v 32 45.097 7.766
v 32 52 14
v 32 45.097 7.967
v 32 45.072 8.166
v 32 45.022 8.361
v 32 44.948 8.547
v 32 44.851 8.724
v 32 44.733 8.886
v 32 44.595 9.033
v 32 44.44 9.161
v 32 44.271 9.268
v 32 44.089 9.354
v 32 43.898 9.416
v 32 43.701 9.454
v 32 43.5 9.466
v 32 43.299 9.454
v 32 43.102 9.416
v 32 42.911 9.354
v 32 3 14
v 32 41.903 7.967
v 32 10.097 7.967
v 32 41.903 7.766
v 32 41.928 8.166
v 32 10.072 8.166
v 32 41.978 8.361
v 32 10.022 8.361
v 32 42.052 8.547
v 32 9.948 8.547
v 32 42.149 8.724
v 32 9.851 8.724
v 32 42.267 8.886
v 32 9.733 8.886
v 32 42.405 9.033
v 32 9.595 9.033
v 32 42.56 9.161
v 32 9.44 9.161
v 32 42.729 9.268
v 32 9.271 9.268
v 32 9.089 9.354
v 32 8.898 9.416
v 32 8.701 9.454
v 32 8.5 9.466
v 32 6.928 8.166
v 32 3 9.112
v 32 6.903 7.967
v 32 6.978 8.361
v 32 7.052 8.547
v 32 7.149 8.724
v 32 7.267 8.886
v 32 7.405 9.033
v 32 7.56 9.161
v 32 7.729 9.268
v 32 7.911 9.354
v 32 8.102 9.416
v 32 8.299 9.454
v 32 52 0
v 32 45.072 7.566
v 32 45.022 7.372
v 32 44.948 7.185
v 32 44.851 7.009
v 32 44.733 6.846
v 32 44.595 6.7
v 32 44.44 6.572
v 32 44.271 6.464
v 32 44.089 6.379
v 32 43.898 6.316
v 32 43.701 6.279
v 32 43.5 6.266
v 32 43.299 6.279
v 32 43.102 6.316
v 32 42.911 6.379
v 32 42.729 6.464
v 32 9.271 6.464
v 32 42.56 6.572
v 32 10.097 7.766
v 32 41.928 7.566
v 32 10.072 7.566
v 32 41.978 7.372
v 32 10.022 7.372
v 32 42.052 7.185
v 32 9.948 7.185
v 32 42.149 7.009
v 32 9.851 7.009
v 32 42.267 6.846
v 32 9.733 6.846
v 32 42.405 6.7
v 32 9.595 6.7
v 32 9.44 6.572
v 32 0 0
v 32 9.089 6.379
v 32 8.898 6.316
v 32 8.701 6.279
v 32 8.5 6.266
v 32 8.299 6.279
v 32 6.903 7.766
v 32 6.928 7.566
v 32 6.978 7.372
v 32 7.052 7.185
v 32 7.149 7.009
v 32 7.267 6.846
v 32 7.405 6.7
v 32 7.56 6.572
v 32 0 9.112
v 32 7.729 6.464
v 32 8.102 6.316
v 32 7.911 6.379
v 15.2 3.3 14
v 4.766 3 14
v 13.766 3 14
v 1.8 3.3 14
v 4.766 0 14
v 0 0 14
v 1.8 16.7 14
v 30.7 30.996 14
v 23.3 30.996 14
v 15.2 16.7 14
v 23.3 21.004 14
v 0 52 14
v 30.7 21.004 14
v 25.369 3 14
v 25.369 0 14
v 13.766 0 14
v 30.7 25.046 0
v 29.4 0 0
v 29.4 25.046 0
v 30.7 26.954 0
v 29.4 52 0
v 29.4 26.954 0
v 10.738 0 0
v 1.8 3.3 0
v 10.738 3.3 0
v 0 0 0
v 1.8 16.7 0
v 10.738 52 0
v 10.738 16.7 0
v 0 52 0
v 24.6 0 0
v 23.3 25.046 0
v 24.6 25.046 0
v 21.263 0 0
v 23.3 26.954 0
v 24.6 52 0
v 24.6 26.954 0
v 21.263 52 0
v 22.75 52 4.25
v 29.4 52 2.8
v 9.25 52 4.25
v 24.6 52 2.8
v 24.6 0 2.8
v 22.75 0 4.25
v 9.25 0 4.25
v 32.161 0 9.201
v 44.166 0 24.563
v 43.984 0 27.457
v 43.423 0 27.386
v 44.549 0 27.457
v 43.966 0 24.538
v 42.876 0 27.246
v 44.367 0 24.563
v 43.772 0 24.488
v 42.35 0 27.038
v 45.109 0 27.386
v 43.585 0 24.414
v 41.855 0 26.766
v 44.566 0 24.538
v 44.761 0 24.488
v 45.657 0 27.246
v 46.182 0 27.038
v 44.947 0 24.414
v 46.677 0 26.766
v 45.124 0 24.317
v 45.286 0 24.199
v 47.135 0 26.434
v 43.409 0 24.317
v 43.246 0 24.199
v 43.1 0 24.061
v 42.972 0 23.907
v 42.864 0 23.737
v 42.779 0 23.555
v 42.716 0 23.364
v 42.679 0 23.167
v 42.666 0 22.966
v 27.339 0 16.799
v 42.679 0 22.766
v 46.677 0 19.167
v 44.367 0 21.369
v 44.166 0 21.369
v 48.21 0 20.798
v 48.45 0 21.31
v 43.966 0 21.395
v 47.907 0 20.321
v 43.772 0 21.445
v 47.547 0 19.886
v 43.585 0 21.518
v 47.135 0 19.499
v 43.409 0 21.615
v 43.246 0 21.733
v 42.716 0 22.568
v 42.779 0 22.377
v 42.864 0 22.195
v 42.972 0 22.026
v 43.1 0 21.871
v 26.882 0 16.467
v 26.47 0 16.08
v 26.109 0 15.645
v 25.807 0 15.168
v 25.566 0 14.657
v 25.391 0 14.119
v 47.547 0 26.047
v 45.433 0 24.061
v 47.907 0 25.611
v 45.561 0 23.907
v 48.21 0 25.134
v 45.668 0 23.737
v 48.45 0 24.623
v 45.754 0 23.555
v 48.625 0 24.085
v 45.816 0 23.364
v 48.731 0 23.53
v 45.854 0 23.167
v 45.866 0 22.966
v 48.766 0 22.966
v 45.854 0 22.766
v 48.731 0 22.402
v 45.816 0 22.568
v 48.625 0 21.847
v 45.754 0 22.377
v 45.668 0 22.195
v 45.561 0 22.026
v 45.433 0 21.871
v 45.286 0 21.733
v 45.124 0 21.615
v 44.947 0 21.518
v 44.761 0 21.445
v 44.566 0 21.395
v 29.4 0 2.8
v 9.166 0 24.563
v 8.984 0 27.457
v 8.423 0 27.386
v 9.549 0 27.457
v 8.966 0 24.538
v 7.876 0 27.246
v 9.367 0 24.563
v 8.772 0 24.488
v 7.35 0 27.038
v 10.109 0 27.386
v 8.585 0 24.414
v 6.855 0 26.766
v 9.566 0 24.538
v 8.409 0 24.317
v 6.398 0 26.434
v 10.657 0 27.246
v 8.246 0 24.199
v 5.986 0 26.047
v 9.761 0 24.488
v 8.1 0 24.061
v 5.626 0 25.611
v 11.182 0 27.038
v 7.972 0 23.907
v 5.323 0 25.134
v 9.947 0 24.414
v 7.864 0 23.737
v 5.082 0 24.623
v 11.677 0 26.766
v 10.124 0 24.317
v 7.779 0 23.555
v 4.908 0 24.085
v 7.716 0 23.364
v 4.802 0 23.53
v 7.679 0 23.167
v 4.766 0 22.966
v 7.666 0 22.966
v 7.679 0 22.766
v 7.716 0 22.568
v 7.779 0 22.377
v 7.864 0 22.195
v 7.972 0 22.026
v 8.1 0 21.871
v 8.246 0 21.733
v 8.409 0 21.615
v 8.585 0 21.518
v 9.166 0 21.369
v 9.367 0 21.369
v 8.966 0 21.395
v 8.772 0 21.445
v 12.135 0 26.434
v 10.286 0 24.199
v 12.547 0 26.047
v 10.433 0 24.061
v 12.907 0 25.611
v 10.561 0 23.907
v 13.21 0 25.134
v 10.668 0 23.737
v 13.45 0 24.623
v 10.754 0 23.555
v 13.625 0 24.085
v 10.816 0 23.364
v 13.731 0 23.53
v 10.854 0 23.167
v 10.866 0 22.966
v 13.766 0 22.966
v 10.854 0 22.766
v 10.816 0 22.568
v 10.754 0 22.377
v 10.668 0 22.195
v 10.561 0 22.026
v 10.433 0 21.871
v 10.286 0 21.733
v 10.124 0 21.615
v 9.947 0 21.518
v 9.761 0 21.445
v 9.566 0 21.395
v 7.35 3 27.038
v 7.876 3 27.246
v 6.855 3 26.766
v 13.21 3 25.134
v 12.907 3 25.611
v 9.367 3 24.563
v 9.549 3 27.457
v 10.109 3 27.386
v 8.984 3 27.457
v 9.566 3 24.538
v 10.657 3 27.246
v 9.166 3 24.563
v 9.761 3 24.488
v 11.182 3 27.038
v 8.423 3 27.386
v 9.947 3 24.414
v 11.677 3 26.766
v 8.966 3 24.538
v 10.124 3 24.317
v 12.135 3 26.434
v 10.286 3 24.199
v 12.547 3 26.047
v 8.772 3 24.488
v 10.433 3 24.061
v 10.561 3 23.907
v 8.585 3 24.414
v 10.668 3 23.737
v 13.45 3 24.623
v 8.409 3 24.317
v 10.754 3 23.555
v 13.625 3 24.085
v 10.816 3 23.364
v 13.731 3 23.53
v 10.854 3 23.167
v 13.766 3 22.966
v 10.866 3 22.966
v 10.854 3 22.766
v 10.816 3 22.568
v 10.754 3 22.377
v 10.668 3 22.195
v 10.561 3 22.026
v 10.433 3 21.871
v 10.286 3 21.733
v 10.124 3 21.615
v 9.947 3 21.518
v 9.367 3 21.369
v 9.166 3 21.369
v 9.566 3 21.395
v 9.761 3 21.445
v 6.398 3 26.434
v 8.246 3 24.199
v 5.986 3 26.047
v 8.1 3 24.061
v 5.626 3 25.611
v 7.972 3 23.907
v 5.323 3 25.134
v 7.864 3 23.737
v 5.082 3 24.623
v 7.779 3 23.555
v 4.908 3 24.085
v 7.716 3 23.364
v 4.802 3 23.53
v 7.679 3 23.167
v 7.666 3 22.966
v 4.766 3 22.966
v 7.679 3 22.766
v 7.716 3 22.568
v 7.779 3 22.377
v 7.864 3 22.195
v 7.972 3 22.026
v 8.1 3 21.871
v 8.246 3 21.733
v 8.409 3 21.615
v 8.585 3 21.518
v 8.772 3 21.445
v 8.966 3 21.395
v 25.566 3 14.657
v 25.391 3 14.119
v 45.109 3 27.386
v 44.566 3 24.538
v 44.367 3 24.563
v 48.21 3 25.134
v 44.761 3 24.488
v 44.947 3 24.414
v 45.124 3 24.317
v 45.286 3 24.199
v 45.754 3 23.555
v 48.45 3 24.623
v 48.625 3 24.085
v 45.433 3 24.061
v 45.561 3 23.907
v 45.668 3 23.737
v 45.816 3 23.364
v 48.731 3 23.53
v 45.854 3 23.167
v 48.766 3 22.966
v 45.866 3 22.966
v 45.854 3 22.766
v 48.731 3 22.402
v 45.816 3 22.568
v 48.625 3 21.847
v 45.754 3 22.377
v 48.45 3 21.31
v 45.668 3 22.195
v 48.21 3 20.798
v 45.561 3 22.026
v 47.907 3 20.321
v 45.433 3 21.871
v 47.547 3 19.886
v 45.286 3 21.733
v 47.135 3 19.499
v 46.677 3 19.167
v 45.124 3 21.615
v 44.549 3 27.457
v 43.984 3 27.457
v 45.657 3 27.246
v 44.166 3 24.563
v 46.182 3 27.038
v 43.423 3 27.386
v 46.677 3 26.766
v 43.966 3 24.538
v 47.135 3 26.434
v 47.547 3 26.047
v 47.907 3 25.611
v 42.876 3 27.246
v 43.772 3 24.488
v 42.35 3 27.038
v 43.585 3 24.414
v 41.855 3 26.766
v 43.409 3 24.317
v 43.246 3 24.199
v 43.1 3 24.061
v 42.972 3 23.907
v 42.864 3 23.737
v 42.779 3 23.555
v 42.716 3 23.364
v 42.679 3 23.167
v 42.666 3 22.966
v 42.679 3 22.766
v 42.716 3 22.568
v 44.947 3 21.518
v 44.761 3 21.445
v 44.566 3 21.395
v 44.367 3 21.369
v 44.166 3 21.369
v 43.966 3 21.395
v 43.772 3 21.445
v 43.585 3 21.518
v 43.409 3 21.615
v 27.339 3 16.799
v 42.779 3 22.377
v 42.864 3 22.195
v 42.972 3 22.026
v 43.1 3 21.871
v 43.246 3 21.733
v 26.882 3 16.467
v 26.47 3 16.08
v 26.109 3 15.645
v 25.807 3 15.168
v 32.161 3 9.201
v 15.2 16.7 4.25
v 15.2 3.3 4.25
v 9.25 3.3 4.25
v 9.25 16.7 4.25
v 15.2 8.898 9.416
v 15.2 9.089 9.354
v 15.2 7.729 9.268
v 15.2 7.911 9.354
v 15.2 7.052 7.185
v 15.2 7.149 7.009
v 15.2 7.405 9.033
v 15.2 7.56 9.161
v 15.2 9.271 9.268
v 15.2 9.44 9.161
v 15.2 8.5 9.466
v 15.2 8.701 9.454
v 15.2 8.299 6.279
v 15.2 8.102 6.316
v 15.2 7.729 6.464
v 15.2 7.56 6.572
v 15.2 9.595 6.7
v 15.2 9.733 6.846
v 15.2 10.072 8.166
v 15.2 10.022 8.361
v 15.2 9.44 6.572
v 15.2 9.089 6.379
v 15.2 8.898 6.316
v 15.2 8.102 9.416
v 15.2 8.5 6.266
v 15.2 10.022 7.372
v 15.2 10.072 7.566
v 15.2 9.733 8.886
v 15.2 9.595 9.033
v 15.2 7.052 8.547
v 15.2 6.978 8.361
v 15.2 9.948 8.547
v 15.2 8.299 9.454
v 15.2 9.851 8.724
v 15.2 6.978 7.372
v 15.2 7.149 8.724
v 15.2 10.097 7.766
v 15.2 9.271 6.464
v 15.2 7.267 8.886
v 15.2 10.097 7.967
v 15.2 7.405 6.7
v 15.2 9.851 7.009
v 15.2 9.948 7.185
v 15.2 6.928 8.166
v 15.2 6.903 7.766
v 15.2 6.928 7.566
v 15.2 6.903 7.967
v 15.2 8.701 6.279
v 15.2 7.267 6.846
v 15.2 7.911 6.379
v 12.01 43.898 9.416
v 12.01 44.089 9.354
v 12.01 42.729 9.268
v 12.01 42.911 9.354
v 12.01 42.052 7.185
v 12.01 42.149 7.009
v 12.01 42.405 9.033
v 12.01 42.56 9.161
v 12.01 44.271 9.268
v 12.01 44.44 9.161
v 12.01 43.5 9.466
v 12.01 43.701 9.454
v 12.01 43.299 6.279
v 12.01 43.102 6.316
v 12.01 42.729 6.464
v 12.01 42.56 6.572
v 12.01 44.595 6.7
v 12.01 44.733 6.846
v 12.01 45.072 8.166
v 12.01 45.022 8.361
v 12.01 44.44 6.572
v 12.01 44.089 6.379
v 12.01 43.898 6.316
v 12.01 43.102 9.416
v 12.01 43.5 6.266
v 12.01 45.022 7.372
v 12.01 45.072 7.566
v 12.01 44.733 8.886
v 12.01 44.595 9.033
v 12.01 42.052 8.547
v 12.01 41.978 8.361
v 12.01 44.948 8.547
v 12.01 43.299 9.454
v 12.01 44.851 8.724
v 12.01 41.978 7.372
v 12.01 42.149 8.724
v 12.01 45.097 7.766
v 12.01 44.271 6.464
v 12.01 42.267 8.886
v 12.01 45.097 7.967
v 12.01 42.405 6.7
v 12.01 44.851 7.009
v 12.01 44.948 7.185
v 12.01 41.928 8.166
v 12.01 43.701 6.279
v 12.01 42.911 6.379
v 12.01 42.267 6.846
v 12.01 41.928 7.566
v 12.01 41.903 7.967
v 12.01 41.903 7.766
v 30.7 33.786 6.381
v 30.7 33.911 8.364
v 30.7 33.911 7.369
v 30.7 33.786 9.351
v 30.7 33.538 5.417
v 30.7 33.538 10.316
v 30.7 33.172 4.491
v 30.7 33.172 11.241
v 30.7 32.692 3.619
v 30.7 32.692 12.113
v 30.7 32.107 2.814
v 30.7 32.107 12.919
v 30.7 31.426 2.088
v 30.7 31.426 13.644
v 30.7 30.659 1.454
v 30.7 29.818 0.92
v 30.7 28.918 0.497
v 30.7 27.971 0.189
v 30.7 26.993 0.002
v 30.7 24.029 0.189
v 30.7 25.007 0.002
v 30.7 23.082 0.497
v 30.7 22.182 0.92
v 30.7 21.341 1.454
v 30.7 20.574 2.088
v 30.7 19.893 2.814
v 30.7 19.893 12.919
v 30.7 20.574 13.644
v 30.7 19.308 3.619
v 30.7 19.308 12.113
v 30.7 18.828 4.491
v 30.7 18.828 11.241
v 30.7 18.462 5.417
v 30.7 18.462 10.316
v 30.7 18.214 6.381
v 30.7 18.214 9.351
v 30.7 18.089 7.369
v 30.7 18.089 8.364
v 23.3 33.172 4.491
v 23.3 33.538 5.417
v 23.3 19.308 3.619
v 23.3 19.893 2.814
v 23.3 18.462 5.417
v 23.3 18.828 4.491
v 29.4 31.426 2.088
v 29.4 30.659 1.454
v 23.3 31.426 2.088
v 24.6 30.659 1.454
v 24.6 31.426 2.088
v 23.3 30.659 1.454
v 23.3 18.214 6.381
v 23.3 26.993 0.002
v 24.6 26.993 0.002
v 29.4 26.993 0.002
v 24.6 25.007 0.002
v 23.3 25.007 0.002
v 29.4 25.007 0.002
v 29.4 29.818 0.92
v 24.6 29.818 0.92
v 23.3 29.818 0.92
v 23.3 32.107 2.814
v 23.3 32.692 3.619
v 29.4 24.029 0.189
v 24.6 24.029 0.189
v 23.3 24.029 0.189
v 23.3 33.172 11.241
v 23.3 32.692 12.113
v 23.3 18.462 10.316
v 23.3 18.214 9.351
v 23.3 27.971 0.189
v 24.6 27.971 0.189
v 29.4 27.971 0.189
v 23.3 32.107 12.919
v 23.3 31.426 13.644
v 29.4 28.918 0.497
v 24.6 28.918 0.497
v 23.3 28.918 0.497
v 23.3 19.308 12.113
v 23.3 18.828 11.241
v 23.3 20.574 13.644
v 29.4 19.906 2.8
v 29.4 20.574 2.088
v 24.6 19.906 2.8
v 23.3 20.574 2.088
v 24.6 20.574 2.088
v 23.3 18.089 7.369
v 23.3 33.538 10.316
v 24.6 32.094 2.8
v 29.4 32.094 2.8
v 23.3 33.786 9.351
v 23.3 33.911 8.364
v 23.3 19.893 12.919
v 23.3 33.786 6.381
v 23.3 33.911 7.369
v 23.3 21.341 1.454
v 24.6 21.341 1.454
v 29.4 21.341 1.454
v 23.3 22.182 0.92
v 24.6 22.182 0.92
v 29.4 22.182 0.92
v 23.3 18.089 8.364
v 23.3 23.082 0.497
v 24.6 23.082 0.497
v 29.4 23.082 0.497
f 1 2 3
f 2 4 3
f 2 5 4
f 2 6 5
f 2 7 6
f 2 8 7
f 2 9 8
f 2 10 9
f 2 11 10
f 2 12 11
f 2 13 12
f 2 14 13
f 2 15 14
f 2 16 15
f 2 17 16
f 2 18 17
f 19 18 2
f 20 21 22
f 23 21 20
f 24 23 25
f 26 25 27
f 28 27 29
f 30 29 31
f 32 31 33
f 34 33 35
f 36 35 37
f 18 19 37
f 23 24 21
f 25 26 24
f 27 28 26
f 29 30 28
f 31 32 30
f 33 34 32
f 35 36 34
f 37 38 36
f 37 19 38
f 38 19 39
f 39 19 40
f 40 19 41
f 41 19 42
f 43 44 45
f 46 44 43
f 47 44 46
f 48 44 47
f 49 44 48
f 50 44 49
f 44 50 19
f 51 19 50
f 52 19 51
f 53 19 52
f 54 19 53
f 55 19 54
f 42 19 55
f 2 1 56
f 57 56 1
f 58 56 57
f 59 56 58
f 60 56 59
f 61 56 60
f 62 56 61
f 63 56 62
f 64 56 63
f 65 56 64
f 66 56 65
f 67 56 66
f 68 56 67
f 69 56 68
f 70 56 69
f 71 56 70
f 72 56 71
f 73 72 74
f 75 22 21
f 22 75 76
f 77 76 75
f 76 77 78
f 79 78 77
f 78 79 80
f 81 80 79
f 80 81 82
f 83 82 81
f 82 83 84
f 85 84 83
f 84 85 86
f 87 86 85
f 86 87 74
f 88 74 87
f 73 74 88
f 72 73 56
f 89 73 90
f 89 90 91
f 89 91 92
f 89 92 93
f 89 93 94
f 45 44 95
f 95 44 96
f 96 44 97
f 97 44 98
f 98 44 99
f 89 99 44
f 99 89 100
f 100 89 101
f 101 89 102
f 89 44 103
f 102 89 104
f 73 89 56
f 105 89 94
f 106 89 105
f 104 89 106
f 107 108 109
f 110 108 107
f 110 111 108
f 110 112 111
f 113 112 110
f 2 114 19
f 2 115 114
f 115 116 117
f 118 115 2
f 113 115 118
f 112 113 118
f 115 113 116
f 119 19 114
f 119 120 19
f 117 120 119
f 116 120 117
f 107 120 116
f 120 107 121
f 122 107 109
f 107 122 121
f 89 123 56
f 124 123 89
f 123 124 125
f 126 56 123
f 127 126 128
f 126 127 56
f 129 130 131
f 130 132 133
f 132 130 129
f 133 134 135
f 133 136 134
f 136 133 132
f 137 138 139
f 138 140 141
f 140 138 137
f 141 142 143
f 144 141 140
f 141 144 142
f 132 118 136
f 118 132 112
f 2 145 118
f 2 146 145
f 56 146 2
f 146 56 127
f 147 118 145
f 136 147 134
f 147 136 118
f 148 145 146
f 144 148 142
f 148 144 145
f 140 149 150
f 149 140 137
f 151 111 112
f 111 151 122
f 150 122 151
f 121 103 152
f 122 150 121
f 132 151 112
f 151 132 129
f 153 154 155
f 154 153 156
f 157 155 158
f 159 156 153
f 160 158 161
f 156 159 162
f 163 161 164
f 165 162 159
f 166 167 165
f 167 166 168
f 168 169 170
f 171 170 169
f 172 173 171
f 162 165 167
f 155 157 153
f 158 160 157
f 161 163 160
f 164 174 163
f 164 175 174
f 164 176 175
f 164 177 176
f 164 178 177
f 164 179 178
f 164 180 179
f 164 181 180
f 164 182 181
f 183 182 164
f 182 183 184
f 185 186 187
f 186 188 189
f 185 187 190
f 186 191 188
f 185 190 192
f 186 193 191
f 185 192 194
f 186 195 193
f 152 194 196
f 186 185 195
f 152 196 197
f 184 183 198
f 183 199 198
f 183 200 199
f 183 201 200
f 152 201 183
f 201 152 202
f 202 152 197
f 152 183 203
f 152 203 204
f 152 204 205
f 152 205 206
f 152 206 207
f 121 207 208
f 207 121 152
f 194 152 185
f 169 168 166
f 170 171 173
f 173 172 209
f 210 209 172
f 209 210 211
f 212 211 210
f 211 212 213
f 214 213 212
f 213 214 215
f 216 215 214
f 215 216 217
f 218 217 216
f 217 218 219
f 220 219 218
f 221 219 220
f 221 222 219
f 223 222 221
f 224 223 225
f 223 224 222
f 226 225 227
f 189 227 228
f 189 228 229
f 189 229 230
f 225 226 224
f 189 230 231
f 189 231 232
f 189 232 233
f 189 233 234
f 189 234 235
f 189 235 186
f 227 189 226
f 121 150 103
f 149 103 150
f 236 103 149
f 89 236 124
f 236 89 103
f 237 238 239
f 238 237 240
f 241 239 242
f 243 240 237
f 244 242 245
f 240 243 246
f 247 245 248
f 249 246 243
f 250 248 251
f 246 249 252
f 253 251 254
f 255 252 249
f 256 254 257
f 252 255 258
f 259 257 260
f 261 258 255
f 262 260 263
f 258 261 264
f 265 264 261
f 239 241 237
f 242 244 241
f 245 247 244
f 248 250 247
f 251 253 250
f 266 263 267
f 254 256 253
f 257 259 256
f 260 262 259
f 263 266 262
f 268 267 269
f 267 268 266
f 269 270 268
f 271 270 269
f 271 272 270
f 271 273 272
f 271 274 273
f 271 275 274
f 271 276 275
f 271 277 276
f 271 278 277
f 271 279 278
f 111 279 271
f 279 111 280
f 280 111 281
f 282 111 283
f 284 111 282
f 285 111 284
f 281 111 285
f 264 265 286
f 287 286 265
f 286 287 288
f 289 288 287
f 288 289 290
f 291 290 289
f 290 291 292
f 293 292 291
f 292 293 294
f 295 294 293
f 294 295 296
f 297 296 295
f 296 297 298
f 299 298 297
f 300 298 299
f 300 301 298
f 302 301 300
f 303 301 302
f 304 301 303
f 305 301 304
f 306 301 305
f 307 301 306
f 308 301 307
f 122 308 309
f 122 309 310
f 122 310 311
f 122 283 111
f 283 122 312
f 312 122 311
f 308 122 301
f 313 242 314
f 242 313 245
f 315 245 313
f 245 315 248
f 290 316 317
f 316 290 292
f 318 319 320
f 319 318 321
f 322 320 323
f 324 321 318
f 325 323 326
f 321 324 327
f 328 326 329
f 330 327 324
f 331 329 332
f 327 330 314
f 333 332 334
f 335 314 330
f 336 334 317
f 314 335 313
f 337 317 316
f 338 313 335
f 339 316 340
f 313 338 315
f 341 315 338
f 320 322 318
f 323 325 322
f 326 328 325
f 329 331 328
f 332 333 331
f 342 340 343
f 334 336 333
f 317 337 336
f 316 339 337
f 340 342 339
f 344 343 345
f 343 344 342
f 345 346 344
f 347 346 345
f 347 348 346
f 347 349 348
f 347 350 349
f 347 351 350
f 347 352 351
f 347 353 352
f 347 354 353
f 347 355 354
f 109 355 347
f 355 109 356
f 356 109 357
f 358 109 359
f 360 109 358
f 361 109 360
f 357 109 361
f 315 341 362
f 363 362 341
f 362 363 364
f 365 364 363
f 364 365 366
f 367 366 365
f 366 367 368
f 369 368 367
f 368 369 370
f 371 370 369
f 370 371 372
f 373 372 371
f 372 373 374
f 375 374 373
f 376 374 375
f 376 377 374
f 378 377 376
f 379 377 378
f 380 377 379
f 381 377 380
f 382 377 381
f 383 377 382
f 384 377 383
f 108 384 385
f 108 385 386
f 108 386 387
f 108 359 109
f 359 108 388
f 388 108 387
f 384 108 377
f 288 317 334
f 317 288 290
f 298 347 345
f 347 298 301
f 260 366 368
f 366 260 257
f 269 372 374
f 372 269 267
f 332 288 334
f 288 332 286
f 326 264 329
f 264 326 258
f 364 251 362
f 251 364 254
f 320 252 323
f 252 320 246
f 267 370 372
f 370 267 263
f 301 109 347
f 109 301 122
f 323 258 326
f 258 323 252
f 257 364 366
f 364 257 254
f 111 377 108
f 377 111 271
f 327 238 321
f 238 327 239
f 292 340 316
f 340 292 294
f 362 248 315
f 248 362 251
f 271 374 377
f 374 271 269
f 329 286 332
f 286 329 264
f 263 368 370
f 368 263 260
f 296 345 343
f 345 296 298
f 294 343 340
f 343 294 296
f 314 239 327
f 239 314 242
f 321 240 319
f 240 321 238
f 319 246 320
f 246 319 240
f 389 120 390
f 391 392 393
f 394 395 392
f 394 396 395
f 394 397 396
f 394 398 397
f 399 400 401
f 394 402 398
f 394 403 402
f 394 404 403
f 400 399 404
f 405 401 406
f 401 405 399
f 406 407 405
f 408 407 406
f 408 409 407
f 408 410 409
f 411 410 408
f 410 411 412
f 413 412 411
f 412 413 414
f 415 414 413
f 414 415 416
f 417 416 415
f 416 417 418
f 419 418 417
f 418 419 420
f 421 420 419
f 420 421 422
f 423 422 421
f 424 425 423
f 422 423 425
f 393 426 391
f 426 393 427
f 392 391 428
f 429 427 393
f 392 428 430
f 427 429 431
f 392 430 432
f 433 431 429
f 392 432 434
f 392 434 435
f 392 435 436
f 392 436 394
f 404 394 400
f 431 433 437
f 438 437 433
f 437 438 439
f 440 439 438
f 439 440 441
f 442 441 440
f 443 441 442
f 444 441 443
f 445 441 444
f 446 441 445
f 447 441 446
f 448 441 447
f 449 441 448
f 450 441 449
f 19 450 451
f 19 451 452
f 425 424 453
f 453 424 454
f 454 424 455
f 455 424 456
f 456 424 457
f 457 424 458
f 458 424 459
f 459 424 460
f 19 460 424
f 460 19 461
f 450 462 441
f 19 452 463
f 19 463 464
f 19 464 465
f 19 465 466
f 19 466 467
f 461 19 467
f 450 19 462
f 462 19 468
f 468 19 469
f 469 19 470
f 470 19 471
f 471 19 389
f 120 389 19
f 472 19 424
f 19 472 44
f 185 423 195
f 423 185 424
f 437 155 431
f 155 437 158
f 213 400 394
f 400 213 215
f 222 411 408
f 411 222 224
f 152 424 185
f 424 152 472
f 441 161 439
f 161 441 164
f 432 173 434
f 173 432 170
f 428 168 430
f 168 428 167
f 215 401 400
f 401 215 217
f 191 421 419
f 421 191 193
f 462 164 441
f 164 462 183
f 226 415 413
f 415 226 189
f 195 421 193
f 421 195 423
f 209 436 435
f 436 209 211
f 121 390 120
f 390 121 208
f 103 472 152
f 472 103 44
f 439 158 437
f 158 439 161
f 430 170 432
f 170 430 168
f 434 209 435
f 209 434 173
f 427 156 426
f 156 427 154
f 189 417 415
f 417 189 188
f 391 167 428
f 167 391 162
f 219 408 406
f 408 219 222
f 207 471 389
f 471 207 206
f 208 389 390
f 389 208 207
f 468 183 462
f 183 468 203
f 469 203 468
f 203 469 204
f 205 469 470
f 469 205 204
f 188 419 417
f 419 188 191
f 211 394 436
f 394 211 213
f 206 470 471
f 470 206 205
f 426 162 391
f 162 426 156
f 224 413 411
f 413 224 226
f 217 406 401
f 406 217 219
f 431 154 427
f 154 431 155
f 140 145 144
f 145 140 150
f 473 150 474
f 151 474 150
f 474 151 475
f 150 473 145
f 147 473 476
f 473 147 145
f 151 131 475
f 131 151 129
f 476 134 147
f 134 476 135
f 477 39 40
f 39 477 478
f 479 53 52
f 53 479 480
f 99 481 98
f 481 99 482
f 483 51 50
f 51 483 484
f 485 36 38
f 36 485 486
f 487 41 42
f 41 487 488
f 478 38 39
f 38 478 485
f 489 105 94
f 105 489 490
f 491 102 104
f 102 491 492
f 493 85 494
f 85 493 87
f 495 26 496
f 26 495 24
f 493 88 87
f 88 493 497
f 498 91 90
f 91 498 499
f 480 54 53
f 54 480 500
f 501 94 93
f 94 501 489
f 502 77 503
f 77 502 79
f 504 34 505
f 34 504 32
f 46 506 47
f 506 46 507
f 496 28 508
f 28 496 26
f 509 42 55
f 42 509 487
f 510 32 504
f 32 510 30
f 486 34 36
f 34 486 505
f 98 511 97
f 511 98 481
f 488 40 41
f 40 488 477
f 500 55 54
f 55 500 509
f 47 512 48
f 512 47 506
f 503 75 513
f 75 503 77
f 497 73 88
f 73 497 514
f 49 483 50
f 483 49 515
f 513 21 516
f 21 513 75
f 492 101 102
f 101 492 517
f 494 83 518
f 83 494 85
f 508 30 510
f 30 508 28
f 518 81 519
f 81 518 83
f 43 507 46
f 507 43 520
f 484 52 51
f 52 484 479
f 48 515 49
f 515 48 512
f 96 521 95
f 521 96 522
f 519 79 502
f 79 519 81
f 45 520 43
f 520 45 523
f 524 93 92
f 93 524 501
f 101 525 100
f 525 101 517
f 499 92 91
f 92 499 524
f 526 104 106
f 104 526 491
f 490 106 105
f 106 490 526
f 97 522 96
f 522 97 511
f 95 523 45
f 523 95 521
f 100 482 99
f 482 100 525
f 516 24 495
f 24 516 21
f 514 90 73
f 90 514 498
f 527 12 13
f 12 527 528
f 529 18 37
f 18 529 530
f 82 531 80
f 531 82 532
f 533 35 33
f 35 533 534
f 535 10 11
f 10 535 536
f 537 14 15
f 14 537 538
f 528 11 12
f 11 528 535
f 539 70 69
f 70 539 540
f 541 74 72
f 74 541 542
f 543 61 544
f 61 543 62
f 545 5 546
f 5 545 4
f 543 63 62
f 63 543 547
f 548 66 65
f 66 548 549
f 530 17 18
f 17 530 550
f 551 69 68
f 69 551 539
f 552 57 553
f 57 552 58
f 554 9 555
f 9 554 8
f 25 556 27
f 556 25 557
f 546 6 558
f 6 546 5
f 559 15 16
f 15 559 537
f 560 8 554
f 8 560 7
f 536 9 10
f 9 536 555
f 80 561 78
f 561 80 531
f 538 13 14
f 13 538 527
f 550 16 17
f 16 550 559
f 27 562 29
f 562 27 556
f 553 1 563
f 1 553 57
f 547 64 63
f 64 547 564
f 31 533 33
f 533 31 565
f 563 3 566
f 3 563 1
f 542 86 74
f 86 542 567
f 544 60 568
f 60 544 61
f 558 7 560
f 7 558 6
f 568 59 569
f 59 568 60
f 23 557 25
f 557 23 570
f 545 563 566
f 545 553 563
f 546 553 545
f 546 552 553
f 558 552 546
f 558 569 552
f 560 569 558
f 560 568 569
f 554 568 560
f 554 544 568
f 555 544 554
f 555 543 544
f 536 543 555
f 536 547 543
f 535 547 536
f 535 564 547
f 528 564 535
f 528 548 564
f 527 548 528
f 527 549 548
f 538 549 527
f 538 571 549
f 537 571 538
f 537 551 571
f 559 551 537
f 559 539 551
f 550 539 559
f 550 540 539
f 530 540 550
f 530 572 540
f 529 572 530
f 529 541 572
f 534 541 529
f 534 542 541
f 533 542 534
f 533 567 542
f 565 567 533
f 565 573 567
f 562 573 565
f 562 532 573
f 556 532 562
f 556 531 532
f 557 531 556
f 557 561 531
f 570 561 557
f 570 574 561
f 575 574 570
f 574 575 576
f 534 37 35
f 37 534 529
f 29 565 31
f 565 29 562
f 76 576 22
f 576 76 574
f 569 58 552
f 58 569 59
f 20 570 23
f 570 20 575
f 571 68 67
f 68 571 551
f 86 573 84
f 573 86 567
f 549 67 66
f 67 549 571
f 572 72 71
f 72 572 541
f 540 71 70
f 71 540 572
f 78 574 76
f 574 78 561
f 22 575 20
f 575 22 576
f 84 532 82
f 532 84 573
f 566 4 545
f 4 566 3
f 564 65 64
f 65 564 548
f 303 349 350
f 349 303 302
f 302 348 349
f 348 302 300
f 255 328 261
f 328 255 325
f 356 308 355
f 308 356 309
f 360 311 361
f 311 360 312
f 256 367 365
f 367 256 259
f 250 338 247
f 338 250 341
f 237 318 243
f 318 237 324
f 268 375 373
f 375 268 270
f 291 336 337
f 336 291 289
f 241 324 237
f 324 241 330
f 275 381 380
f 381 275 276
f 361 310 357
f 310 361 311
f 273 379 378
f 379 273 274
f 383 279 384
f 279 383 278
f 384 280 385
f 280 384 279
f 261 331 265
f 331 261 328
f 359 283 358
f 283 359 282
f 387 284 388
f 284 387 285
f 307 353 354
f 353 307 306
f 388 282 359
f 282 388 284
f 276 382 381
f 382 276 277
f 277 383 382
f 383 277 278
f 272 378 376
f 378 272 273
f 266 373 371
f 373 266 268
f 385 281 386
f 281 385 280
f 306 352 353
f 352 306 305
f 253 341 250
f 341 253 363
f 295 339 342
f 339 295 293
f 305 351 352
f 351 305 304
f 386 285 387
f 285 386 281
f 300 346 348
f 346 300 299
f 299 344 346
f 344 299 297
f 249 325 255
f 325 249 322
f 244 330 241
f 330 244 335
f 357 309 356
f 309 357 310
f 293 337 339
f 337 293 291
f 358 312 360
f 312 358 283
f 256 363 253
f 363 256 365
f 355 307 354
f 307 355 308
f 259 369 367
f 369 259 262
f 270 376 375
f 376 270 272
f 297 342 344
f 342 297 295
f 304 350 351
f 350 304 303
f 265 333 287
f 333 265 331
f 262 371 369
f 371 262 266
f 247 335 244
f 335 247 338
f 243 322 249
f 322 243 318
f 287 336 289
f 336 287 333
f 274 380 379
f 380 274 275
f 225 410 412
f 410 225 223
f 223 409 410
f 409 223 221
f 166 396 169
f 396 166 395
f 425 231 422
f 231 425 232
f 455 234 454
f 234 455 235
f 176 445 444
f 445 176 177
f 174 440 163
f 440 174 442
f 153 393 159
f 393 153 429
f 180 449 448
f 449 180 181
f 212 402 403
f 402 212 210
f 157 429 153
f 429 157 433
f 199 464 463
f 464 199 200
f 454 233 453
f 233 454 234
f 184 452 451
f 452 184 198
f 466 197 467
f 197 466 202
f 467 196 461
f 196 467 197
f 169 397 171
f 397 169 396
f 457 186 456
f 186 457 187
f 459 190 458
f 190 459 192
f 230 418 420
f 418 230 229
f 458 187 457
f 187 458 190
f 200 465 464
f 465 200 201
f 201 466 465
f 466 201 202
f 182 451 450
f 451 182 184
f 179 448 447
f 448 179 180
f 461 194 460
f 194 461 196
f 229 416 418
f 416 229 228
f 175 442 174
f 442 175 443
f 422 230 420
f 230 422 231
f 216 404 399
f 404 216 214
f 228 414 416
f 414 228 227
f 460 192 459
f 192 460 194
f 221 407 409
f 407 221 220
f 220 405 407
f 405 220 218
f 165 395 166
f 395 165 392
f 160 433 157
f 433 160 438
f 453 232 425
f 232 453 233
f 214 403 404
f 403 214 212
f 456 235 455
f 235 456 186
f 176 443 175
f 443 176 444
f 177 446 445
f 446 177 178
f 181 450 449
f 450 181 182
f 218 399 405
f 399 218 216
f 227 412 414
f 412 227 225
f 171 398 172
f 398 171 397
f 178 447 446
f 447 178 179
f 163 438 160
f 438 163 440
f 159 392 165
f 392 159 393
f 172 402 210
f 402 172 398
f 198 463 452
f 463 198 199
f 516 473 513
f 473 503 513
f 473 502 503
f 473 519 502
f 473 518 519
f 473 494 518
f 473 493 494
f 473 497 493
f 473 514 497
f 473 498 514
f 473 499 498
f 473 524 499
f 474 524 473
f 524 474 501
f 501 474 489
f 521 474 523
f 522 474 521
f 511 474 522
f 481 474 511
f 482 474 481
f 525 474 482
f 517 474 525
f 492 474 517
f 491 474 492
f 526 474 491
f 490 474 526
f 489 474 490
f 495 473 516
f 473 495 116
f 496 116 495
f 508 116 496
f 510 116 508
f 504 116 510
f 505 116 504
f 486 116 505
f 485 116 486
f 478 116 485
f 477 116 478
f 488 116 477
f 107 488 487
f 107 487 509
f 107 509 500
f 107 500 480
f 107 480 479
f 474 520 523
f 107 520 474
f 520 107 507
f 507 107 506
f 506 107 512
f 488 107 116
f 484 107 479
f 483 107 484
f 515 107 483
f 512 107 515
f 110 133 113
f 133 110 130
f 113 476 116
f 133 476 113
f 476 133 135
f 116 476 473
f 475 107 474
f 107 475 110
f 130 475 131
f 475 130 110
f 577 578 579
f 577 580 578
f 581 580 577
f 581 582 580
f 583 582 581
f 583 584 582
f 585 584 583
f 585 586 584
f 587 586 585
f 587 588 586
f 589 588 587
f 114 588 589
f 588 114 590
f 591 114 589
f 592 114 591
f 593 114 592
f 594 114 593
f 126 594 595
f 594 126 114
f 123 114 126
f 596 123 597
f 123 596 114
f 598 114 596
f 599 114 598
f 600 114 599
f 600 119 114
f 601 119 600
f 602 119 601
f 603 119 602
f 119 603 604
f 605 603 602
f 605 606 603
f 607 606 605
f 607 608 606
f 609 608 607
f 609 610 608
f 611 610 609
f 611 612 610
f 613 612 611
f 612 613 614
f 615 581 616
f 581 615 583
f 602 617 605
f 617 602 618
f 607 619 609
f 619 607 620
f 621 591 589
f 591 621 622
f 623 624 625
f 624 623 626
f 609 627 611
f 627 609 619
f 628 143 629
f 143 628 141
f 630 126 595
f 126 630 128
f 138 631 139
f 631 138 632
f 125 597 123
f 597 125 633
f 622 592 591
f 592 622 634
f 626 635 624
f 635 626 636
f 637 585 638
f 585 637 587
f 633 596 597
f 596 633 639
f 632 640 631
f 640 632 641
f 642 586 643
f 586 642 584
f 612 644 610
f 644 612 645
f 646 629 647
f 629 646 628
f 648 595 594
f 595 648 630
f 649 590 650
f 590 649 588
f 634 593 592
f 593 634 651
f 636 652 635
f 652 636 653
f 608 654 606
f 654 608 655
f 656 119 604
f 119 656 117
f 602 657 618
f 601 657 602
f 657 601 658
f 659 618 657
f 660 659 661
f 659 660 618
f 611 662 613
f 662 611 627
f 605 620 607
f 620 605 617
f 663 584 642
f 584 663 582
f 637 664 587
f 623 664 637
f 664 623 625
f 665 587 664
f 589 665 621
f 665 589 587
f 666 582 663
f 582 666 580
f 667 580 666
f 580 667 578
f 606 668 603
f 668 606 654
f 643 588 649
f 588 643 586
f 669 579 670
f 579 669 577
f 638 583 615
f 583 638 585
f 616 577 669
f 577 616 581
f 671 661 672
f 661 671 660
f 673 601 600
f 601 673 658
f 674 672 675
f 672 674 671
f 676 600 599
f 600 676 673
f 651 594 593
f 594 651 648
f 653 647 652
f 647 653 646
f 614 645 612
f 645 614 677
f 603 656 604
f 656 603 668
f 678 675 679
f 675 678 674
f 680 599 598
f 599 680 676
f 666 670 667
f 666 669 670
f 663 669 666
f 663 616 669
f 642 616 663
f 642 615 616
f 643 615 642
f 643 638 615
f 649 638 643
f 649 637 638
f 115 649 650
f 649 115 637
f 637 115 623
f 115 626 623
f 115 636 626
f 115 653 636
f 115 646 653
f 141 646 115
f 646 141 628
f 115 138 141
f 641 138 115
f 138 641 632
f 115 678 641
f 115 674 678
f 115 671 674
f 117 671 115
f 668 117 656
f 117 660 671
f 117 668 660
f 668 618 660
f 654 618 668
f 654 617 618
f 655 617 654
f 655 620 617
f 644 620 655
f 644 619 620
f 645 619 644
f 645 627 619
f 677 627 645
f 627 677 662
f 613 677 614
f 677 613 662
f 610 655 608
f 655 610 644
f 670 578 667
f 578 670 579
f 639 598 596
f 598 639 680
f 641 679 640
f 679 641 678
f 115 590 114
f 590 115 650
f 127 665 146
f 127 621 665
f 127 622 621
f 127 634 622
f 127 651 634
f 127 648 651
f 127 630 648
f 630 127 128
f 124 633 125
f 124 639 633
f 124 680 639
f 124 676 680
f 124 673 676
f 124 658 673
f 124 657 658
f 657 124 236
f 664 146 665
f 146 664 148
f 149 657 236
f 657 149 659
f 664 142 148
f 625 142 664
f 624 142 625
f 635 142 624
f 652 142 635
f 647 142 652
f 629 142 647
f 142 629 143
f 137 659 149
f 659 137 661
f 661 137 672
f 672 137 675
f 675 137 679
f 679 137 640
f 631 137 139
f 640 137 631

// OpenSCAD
/*
  =============================================================================
  04_Carrinho_Y.scad - Carrinho do Eixo Y (GEOMETRIA CORRIGIDA DEFINITIVA)
  =============================================================================
  Correções de Engenharia Mecânica:
    - Motor Y: montado na face direita (+X) com eixo horizontal (-X) acionando Rack Y.
    - Motor Z: montado na face frontal (-Y) com eixo horizontal (+Y) acionando Rack Z do êmbolo.
    - SEPARAÇÃO TOTAL MOTOR Y vs MOTOR Z (zero colisão / zero sobreposição).
    - Canal dovetail_female_y no fundo.
    - Guia da caneta (Modulo Z) no lado esquerdo.
    - 1 ÚNICO COMPONENTE CONECTADO no STL.
  
  Orientação de impressão: fundo do carrinho no leito (Z=0).
  =============================================================================
*/

include <00_Parametros.scad>;

module carrinho_y() {
  // Dimensões do corpo principal
  cy_width   = 32.0;  // X (largura transversal)
  cy_length  = y_carriage_length; // Y; comporta a flange de 35mm do 28BYJ-48
  cy_height  = 14.0;  // Z (altura total)

  // Centro do canal dovetail no eixo X
  dt_local_x = cy_width / 2;  // X=16

  // Motor Y: eixo horizontal em -X (face direita +X)
  motor_y_z_local = tooth_height/2 + gear_pitch_radius + gear_mesh_clearance;
  motor_y_x_local = cy_width;
  hole_y_front     = cy_length/2 - motor_flange_dist/2;   // -3.5
  hole_y_back      = cy_length/2 + motor_flange_dist/2;    // 31.5

  // Motor Z: coordenadas derivadas dos mesmos parametros usados na montagem.
  // O eixo foi elevado para os volumes dos pinhoes Y e Z nao se cruzarem.
  motor_z_x_local = z_motor_axis_x;
  motor_z_z_local = z_motor_axis_z;
  hole_z_left     = motor_z_x_local - motor_flange_dist/2;  // -4.0
  hole_z_right    = motor_z_x_local + motor_flange_dist/2;  // 31.0

  // Guia retangular do carro Z: impede rotacao e deixa a caneta complacente
  // deslizar dentro do carro, em vez de usar a caneta como guia estrutural.
  z_slot_w = z_carriage_w + 2 * slide_clearance_z;
  z_slot_d = z_carriage_d + 2 * slide_clearance_z;

  difference() {
    union() {
      color([0.35, 0.42, 0.48]) {
        // ====== CORPO PRINCIPAL ======
        cube([cy_width, cy_length, cy_height]);

        // ====== ORELHAS DE MONTAGEM DO MOTOR Y (face +X) ======
        // As duas orelhas cabem integralmente nos 44mm do carrinho. Evitar
        // hull ate as extremidades impede que a orelha frontal invada -Y.
        translate([motor_y_x_local, hole_y_front, motor_y_z_local])
          rotate([0, -90, 0])
            cylinder(r=wall_screw, h=3.0);
        translate([motor_y_x_local, hole_y_back, motor_y_z_local])
          rotate([0, -90, 0])
            cylinder(r=wall_screw, h=3.0);

        // ====== ORELHAS DE MONTAGEM DO MOTOR Z (face -Y) ======
        // Cada placa desce ate o corpo; na versao anterior ambas flutuavam.
        hull() {
          translate([hole_z_left, 0, motor_z_z_local])
            rotate([-90, 0, 0])
              cylinder(r=wall_screw, h=3.0);
          translate([hole_z_left, 0, cy_height - 1.0])
            rotate([-90, 0, 0])
              cylinder(r=wall_screw, h=3.0);
        }
        hull() {
          translate([hole_z_right, 0, motor_z_z_local])
            rotate([-90, 0, 0])
              cylinder(r=wall_screw, h=3.0);
          translate([cy_width - wall_screw/2, 0, cy_height - 1.0])
            rotate([-90, 0, 0])
              cylinder(r=wall_screw, h=3.0);
        }
      }
    }

    // ====== CANAL DOVETAIL FÊMEA Y (corte no fundo) ======
    translate([dt_local_x, 0, -0.5])
      dovetail_female_y(length=cy_length);

    // ====== FUROS M3 MOTOR Y ======
    translate([motor_y_x_local + EPS, hole_y_front, motor_y_z_local])
      rotate([0, -90, 0])
        cylinder(r=motor_flange_hole_r, h=20);

    translate([motor_y_x_local + EPS, hole_y_back, motor_y_z_local])
      rotate([0, -90, 0])
        cylinder(r=motor_flange_hole_r, h=20);

    // ====== FUROS M3 MOTOR Z ======
    translate([hole_z_left, -10.0, motor_z_z_local])
      rotate([-90, 0, 0])
        cylinder(r=motor_flange_hole_r, h=20);

    translate([hole_z_right, -10.0, motor_z_z_local])
      rotate([-90, 0, 0])
        cylinder(r=motor_flange_hole_r, h=20);

    // ====== GUIA PASSANTE DO CARRO Z ======
    translate([z_axis_center_x - z_slot_w/2,
               z_axis_center_y - z_slot_d/2, -EPS])
      cube([z_slot_w, z_slot_d, cy_height + EPS*2]);

    // ====== BOLSO DO PINHAO Y ======
    pinion_y_start_x = y_rack_center_x - pinion_thickness/2
                       - (y_dovetail_center_x - cy_width/2) - 0.2;
    translate([pinion_y_start_x, cy_length/2, motor_y_z_local])
      rotate([0, 90, 0])
        cylinder(r=gear_outer_radius + 0.35, h=pinion_thickness + 0.4);

    // Canal longitudinal da cremalheira Y. O bolso circular acima libera o
    // pinhao; este rasgo impede que o rack atravesse o fundo do carrinho.
    rack_y_local_x = y_rack_center_x
                     - (y_dovetail_center_x - cy_width/2);
    translate([rack_y_local_x - (rack_width + 0.8)/2,
               -EPS, -EPS])
      cube([rack_width + 0.8, cy_length + EPS*2,
            tooth_height + 0.6 + EPS]);
  }
}

// Renderização para impressão/exportação
carrinho_y();
